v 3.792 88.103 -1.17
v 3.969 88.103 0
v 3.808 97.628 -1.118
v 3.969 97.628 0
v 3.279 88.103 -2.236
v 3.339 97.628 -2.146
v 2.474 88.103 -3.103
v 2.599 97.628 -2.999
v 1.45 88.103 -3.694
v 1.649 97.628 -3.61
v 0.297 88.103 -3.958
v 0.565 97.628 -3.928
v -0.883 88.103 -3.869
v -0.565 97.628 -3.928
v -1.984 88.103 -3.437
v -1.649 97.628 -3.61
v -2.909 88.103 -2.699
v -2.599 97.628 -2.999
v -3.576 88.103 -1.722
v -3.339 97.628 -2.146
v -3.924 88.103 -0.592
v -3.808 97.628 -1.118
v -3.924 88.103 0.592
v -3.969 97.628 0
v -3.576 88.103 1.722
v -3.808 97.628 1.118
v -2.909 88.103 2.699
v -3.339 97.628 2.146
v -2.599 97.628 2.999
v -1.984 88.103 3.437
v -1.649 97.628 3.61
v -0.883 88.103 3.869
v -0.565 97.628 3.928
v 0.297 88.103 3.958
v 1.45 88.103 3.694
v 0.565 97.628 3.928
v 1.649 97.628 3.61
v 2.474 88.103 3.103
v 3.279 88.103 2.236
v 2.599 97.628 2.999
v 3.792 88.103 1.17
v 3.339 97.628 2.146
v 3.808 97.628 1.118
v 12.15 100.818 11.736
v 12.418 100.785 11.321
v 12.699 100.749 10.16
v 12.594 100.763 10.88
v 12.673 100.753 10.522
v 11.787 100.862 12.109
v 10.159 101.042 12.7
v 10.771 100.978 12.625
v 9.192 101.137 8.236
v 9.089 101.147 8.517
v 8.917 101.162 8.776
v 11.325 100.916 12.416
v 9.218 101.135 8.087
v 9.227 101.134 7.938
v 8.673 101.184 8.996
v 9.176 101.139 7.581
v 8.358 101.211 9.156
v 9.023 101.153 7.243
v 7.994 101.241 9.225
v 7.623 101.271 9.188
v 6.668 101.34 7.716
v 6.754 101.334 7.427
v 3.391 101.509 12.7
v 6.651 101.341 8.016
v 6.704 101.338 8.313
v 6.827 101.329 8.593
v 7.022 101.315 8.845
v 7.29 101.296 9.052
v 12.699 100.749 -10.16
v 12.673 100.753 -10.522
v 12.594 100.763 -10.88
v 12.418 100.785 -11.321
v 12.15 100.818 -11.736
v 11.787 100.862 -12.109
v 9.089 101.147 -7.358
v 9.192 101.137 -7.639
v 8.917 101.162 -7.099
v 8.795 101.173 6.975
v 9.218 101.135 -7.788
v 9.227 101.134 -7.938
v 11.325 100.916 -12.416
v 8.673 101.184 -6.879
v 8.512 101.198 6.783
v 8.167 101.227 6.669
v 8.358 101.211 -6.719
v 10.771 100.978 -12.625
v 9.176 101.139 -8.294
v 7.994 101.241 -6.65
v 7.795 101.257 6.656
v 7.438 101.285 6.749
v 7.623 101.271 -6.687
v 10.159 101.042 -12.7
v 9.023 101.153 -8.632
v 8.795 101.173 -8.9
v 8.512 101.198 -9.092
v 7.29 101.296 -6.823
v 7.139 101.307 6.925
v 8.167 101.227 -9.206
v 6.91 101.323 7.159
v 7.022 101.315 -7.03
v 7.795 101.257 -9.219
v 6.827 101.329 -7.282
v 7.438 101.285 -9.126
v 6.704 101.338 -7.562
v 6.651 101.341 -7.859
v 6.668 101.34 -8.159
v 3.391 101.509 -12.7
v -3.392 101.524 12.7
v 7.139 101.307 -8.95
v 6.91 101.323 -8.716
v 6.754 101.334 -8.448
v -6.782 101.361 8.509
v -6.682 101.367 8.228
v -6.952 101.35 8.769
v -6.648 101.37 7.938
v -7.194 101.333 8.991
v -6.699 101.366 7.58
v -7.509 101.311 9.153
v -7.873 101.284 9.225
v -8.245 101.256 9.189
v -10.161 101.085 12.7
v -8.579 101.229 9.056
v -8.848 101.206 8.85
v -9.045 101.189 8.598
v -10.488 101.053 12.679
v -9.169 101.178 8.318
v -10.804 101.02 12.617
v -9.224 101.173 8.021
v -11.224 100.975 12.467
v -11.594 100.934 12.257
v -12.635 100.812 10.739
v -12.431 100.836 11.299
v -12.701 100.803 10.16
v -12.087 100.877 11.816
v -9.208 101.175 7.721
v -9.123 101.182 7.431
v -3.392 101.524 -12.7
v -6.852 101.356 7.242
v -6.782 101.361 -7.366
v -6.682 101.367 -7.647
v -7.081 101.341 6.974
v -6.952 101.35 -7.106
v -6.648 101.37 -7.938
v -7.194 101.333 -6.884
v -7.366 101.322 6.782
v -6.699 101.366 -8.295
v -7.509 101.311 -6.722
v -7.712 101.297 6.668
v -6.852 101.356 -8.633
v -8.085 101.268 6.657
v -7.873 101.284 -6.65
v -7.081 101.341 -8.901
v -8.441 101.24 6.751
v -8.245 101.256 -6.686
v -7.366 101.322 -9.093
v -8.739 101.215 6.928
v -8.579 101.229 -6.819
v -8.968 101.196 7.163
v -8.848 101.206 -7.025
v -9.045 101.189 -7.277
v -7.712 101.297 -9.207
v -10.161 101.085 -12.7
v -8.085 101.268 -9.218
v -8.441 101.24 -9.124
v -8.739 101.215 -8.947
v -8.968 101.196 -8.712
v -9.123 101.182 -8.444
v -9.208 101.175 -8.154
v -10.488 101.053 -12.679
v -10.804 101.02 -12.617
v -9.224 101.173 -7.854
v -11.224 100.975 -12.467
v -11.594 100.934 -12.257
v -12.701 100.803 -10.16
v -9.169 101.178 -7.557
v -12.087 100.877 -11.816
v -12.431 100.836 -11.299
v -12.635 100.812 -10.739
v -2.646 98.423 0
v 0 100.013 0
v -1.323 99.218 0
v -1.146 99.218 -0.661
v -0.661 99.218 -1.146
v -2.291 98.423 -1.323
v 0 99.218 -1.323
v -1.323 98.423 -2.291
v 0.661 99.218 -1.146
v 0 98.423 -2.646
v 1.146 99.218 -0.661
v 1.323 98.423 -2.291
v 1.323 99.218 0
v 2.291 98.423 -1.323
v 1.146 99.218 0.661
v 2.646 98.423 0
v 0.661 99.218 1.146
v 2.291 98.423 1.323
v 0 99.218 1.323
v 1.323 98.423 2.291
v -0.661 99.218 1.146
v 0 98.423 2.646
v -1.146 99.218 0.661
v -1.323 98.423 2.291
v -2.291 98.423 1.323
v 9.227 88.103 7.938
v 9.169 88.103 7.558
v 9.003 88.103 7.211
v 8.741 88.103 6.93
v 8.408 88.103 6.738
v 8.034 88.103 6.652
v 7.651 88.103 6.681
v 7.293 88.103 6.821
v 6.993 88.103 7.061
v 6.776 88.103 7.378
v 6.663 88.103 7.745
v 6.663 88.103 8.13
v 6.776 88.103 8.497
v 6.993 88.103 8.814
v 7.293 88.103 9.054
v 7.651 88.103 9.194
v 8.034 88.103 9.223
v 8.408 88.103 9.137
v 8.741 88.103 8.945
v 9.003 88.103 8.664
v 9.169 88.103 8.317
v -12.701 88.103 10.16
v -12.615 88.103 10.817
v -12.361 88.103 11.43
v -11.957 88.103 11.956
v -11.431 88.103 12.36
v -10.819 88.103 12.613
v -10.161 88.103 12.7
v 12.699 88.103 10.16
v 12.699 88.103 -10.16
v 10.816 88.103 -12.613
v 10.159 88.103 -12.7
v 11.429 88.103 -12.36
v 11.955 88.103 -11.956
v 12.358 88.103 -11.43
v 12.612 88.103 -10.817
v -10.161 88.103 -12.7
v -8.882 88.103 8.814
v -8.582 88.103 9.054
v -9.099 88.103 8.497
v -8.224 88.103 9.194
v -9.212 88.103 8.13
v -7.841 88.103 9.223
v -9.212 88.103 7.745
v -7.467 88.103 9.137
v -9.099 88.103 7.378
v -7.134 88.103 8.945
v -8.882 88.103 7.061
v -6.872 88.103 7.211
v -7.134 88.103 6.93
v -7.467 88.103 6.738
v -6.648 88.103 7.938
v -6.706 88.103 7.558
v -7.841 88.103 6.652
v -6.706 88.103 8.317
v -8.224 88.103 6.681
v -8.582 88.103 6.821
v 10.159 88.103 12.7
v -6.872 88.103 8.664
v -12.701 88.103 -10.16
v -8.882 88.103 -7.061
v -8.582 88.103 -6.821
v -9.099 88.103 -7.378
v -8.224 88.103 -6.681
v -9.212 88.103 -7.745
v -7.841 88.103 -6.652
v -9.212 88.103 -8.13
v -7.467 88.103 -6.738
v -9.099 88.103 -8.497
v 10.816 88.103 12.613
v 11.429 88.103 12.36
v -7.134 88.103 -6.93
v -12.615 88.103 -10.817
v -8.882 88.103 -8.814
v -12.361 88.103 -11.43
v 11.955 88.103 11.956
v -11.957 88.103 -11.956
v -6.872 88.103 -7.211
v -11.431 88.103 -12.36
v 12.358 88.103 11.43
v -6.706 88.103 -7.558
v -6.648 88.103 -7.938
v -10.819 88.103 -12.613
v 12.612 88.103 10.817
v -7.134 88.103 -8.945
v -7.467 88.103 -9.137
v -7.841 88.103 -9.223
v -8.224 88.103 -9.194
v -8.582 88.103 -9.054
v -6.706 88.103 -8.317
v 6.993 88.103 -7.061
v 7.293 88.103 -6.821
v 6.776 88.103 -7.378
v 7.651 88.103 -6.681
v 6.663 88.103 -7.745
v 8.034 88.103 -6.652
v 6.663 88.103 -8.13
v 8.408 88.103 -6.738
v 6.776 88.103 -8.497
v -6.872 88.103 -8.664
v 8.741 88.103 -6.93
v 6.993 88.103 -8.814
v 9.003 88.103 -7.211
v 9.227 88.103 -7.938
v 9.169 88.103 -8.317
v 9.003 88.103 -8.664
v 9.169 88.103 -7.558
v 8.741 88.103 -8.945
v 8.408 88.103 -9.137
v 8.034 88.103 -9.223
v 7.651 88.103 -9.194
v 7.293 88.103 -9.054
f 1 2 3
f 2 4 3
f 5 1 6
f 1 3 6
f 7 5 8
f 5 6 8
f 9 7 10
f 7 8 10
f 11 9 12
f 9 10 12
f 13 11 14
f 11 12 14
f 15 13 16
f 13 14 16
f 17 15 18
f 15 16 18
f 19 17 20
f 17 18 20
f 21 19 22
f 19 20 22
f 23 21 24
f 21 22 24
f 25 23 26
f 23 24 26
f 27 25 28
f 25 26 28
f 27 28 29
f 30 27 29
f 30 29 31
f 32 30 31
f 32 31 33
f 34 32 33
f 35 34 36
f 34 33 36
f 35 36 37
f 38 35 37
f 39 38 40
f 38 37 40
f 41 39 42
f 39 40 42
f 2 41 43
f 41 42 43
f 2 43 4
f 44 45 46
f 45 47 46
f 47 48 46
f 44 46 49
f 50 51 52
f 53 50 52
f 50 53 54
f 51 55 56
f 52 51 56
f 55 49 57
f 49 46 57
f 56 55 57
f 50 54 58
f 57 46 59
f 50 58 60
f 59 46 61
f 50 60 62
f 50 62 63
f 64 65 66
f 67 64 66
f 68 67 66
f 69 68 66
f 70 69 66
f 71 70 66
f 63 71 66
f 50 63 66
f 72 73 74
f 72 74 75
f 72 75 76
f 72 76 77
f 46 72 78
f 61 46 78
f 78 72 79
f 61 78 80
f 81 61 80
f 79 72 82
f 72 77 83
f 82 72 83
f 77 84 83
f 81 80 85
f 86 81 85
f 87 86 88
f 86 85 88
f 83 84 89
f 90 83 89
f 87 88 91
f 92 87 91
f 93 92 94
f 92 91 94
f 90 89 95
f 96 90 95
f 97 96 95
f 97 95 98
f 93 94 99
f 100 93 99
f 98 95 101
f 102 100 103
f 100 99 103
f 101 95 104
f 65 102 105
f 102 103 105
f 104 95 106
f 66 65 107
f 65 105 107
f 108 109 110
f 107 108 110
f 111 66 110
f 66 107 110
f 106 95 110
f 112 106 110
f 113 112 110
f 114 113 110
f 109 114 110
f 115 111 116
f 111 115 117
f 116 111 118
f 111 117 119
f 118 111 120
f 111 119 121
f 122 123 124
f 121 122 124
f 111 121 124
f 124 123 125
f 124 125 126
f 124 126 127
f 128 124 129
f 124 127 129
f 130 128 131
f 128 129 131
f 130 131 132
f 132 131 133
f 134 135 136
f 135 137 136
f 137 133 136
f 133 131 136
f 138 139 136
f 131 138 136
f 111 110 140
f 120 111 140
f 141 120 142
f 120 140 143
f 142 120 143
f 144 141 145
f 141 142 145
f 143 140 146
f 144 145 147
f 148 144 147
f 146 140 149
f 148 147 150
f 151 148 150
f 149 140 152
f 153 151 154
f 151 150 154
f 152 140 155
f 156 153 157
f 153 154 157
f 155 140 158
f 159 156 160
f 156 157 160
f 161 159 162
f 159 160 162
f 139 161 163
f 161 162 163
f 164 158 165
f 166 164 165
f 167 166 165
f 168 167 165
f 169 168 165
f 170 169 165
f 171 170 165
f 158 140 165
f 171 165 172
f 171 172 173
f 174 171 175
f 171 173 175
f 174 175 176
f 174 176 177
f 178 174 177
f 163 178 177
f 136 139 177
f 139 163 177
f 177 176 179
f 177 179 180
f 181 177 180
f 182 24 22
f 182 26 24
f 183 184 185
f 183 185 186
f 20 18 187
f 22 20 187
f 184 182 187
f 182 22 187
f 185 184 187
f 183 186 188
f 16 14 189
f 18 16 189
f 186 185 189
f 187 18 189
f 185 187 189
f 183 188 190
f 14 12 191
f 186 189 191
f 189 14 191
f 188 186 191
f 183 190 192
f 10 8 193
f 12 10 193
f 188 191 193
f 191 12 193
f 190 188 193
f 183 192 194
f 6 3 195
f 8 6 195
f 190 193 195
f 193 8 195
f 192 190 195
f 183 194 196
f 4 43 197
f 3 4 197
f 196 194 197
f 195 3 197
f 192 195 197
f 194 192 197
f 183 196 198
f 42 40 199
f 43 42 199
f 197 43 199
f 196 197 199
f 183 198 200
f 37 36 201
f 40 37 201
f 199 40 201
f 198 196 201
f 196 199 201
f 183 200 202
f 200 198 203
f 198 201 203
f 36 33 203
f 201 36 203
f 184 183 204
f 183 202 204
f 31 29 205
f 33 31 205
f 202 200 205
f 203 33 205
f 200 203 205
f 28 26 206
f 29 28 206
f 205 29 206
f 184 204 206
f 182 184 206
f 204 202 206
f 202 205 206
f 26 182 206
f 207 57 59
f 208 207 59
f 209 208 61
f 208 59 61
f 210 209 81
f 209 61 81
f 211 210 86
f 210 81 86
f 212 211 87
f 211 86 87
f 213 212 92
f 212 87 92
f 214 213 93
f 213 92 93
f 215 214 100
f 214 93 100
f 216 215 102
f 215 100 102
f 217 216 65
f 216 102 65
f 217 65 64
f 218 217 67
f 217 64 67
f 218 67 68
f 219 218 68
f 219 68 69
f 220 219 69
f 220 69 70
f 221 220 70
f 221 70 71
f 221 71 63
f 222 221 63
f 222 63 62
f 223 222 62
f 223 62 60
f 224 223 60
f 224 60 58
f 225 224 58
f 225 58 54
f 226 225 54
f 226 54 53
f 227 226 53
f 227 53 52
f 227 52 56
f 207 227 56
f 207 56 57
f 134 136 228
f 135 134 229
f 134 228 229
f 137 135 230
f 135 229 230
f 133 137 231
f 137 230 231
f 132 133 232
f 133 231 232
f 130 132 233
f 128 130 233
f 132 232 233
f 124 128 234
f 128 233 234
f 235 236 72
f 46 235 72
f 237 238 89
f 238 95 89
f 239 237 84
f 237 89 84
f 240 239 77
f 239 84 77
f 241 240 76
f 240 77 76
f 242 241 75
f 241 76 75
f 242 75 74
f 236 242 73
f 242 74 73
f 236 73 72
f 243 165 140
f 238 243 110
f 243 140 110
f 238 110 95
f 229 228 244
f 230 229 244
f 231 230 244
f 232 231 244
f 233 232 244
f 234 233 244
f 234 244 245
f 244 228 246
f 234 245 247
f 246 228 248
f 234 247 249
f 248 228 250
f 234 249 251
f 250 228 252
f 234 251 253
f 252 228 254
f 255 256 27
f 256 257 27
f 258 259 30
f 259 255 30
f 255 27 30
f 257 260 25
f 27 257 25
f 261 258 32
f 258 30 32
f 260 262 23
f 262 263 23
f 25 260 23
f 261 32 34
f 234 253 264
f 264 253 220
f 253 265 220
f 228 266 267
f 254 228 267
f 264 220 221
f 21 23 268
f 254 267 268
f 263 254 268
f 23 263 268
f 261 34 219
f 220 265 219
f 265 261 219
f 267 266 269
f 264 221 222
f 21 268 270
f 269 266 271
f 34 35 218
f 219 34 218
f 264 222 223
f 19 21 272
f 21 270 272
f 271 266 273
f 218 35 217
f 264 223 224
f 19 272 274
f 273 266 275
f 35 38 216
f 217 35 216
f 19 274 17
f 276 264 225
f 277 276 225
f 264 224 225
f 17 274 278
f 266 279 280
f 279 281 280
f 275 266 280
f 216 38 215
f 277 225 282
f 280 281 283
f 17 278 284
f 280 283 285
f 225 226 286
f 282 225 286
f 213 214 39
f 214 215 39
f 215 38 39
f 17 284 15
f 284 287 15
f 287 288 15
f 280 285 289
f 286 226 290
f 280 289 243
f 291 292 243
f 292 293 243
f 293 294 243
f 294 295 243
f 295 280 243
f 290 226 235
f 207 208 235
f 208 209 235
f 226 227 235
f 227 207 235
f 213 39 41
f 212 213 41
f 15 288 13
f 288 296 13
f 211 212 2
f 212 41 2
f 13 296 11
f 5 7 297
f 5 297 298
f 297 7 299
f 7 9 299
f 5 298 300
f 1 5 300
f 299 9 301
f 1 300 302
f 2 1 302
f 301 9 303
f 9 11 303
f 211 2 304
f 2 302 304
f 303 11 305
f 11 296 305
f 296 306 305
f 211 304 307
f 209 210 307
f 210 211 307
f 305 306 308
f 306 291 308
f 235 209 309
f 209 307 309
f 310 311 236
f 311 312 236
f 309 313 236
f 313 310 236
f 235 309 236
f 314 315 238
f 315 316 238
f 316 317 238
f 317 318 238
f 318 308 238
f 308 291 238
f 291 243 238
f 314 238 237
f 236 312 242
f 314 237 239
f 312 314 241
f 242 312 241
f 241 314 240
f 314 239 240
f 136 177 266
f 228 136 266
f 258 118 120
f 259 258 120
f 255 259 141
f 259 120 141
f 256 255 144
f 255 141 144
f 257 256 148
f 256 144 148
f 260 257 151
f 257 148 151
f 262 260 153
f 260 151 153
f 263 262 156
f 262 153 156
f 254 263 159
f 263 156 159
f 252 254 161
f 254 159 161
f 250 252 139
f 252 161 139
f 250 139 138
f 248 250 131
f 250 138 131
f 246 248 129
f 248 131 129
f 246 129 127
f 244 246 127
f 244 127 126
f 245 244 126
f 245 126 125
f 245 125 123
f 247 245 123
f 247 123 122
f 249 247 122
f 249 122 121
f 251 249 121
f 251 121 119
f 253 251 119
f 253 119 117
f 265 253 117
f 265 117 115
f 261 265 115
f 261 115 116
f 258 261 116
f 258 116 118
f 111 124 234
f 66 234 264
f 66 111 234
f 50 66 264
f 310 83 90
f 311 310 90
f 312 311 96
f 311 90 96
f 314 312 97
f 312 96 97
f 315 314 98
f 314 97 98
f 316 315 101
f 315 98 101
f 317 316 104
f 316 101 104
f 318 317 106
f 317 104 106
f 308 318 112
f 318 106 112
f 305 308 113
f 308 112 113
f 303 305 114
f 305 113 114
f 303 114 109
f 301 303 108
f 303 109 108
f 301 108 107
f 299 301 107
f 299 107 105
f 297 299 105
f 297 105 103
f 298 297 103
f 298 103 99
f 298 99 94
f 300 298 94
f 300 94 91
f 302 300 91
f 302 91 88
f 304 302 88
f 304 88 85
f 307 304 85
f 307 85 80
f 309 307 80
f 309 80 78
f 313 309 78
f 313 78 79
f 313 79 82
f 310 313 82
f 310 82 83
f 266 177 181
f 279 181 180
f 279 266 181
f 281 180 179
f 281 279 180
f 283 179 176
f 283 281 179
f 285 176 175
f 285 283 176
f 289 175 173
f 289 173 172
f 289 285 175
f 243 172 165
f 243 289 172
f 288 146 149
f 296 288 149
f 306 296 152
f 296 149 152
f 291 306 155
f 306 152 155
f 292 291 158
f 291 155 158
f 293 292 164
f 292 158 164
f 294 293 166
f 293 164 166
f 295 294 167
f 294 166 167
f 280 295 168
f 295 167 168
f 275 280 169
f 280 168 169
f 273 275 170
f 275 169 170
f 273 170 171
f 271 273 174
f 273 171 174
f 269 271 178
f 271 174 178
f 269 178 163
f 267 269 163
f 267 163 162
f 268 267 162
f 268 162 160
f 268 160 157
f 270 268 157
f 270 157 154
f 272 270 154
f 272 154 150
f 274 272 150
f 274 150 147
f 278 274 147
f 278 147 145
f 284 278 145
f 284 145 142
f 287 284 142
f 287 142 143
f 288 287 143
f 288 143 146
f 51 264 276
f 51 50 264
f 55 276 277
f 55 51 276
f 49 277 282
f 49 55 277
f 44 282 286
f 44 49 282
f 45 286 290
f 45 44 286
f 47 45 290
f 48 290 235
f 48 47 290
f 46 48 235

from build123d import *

# Parameters (mm, degrees)
BOSS_EXTRUDE1_DEPTH             = 12.7
BOSS_EXTRUDE1_DEPTH_BACK        = 12.7
TAP_DRILL_FOR_3_8_16_TAP1_D     = 7.9375
TAP_DRILL_FOR_3_8_16_TAP1_DEPTH = 9.525
TAP_DRILL_FOR_3_8_16_TAP1_TIP   = 2.384665582
F_5_40_TAPPED_HOLE1_D           = 2.5781
FILLET1_R                       = 2.54


with BuildPart() as part:
    # Sketch1 → Boss-Extrude1 (new, two sides: drawn at the far end of the back side and taken through both)
    with BuildSketch(Plane.XY.offset(-BOSS_EXTRUDE1_DEPTH_BACK)):
        with BuildLine():
            Line((-12.701329683, 100.803292467), (-12.701329683, 88.103292467))
            Line((-12.701329683, 88.103292467), (12.698670317, 88.103292467))
            Line((12.698670317, 88.103292467), (12.698670317, 100.749441262))
            ThreePointArc((12.698670317, 100.749441262), (0.000359797, 101.573243718), (-12.701329683, 100.803292467))
        make_face()
    extrude(amount=BOSS_EXTRUDE1_DEPTH + BOSS_EXTRUDE1_DEPTH_BACK)

    # Tap Drill for 3/8-16 Tap1
    with Locations(Plane(origin=(0, 88.103292467, 0), x_dir=(-1, 0, 0), z_dir=(0, -1, 0))):
        with Locations((0, 0)):
            Hole(TAP_DRILL_FOR_3_8_16_TAP1_D / 2, depth=TAP_DRILL_FOR_3_8_16_TAP1_DEPTH)
            with Locations((0, 0, -(TAP_DRILL_FOR_3_8_16_TAP1_DEPTH + TAP_DRILL_FOR_3_8_16_TAP1_TIP / 2))):  # 118° drill point
                Cone(0, TAP_DRILL_FOR_3_8_16_TAP1_D / 2, TAP_DRILL_FOR_3_8_16_TAP1_TIP, mode=Mode.SUBTRACT)

    # #5-40 Tapped Hole1 (through all)
    with Locations(Plane(origin=(0, 88.103292467, 0), x_dir=(-1, 0, 0), z_dir=(0, -1, 0))):
        with Locations((-7.9375, -7.9375), (-7.9375, 7.9375), (7.9375, 7.9375), (7.9375, -7.9375)):
            Hole(F_5_40_TAPPED_HOLE1_D / 2)

    # Fillet1
    fillet1_edges = [part.edges().sort_by_distance(p)[0] for p in [
        (-12.701329683, 94.453292467, 12.7),
        (12.698670317, 94.426366864, -12.7),
        (12.698670317, 94.426366864, 12.7),
        (-12.701329683, 94.453292467, -12.7),
    ]]
    fillet(fillet1_edges, radius=FILLET1_R)


solid = part.part
